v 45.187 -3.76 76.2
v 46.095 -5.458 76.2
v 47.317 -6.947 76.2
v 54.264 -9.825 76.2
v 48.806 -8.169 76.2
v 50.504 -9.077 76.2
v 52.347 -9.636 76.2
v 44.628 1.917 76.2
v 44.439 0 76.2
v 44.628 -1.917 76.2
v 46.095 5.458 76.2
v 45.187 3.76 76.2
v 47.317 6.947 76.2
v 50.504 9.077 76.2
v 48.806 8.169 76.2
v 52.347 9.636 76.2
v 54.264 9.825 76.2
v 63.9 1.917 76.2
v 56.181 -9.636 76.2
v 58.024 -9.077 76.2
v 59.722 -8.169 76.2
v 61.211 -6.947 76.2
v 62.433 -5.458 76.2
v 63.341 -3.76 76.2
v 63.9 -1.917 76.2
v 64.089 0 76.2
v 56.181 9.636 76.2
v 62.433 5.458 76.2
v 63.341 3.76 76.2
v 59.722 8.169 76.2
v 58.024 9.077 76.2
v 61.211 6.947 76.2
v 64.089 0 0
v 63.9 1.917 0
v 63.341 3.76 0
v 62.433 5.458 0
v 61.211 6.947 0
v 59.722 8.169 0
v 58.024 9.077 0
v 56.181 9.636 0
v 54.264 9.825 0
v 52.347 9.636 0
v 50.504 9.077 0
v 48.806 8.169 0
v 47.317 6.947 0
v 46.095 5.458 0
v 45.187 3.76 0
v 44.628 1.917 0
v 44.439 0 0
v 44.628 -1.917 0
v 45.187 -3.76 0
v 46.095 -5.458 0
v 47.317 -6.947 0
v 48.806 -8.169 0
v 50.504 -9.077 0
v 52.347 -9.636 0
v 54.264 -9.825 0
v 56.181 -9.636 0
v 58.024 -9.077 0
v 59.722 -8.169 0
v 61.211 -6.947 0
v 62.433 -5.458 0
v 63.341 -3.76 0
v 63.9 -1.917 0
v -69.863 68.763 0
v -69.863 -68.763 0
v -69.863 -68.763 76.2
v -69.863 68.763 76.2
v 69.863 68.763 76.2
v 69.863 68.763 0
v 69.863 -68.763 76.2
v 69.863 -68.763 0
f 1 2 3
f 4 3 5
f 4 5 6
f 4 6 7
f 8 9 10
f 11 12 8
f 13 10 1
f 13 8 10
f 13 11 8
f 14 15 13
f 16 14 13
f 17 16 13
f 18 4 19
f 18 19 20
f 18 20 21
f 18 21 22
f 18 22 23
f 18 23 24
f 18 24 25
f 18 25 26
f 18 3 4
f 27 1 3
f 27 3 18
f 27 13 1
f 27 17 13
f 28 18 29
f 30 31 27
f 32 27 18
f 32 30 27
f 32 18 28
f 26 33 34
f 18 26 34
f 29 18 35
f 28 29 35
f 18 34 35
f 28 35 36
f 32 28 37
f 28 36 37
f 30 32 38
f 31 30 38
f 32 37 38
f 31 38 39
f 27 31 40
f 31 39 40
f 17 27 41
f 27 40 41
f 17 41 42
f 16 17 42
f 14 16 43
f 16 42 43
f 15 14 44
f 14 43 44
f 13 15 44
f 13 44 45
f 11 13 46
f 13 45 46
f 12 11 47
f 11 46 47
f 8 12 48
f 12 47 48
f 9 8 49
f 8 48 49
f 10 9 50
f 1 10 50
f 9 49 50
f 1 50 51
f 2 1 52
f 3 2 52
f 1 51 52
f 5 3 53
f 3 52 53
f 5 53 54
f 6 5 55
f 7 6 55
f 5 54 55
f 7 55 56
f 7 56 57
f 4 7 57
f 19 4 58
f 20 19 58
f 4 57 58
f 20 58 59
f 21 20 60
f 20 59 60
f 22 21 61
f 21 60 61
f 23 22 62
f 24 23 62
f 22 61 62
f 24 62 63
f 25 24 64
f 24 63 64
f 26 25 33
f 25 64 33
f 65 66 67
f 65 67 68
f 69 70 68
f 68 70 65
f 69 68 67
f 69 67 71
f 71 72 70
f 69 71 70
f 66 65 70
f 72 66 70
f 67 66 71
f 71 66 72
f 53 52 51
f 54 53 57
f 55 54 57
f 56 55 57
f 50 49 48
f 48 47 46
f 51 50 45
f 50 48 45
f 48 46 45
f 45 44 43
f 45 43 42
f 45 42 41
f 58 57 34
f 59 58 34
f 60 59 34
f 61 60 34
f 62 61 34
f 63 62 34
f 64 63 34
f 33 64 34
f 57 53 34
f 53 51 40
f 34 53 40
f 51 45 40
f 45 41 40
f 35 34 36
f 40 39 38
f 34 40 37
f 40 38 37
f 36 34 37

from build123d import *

# Parameters (mm, degrees)
F1_R     = 9.8246353949
F2_DEPTH = 76.2
F0_W     = 69.8630958796
F0_H     = 137.5265717506


with BuildPart() as f2:
    # F1 (on Top) → F2 (new body)
    with BuildSketch(Plane.XY):
        with Locations((54.2640089989, 0)):
            Circle(F1_R)
    extrude(amount=F2_DEPTH)


with BuildPart() as f2b:
    # F0 (on Top) → F2, piece 2 (new body)
    with BuildSketch(Plane.XY):
        with Locations((34.9315479398, 0)):
            Rectangle(F0_W, F0_H)
        with Locations((-34.9315479398, 0)):
            Rectangle(F0_W, F0_H)
    extrude(amount=F2_DEPTH)


solid = Compound([f2.part, f2b.part])
